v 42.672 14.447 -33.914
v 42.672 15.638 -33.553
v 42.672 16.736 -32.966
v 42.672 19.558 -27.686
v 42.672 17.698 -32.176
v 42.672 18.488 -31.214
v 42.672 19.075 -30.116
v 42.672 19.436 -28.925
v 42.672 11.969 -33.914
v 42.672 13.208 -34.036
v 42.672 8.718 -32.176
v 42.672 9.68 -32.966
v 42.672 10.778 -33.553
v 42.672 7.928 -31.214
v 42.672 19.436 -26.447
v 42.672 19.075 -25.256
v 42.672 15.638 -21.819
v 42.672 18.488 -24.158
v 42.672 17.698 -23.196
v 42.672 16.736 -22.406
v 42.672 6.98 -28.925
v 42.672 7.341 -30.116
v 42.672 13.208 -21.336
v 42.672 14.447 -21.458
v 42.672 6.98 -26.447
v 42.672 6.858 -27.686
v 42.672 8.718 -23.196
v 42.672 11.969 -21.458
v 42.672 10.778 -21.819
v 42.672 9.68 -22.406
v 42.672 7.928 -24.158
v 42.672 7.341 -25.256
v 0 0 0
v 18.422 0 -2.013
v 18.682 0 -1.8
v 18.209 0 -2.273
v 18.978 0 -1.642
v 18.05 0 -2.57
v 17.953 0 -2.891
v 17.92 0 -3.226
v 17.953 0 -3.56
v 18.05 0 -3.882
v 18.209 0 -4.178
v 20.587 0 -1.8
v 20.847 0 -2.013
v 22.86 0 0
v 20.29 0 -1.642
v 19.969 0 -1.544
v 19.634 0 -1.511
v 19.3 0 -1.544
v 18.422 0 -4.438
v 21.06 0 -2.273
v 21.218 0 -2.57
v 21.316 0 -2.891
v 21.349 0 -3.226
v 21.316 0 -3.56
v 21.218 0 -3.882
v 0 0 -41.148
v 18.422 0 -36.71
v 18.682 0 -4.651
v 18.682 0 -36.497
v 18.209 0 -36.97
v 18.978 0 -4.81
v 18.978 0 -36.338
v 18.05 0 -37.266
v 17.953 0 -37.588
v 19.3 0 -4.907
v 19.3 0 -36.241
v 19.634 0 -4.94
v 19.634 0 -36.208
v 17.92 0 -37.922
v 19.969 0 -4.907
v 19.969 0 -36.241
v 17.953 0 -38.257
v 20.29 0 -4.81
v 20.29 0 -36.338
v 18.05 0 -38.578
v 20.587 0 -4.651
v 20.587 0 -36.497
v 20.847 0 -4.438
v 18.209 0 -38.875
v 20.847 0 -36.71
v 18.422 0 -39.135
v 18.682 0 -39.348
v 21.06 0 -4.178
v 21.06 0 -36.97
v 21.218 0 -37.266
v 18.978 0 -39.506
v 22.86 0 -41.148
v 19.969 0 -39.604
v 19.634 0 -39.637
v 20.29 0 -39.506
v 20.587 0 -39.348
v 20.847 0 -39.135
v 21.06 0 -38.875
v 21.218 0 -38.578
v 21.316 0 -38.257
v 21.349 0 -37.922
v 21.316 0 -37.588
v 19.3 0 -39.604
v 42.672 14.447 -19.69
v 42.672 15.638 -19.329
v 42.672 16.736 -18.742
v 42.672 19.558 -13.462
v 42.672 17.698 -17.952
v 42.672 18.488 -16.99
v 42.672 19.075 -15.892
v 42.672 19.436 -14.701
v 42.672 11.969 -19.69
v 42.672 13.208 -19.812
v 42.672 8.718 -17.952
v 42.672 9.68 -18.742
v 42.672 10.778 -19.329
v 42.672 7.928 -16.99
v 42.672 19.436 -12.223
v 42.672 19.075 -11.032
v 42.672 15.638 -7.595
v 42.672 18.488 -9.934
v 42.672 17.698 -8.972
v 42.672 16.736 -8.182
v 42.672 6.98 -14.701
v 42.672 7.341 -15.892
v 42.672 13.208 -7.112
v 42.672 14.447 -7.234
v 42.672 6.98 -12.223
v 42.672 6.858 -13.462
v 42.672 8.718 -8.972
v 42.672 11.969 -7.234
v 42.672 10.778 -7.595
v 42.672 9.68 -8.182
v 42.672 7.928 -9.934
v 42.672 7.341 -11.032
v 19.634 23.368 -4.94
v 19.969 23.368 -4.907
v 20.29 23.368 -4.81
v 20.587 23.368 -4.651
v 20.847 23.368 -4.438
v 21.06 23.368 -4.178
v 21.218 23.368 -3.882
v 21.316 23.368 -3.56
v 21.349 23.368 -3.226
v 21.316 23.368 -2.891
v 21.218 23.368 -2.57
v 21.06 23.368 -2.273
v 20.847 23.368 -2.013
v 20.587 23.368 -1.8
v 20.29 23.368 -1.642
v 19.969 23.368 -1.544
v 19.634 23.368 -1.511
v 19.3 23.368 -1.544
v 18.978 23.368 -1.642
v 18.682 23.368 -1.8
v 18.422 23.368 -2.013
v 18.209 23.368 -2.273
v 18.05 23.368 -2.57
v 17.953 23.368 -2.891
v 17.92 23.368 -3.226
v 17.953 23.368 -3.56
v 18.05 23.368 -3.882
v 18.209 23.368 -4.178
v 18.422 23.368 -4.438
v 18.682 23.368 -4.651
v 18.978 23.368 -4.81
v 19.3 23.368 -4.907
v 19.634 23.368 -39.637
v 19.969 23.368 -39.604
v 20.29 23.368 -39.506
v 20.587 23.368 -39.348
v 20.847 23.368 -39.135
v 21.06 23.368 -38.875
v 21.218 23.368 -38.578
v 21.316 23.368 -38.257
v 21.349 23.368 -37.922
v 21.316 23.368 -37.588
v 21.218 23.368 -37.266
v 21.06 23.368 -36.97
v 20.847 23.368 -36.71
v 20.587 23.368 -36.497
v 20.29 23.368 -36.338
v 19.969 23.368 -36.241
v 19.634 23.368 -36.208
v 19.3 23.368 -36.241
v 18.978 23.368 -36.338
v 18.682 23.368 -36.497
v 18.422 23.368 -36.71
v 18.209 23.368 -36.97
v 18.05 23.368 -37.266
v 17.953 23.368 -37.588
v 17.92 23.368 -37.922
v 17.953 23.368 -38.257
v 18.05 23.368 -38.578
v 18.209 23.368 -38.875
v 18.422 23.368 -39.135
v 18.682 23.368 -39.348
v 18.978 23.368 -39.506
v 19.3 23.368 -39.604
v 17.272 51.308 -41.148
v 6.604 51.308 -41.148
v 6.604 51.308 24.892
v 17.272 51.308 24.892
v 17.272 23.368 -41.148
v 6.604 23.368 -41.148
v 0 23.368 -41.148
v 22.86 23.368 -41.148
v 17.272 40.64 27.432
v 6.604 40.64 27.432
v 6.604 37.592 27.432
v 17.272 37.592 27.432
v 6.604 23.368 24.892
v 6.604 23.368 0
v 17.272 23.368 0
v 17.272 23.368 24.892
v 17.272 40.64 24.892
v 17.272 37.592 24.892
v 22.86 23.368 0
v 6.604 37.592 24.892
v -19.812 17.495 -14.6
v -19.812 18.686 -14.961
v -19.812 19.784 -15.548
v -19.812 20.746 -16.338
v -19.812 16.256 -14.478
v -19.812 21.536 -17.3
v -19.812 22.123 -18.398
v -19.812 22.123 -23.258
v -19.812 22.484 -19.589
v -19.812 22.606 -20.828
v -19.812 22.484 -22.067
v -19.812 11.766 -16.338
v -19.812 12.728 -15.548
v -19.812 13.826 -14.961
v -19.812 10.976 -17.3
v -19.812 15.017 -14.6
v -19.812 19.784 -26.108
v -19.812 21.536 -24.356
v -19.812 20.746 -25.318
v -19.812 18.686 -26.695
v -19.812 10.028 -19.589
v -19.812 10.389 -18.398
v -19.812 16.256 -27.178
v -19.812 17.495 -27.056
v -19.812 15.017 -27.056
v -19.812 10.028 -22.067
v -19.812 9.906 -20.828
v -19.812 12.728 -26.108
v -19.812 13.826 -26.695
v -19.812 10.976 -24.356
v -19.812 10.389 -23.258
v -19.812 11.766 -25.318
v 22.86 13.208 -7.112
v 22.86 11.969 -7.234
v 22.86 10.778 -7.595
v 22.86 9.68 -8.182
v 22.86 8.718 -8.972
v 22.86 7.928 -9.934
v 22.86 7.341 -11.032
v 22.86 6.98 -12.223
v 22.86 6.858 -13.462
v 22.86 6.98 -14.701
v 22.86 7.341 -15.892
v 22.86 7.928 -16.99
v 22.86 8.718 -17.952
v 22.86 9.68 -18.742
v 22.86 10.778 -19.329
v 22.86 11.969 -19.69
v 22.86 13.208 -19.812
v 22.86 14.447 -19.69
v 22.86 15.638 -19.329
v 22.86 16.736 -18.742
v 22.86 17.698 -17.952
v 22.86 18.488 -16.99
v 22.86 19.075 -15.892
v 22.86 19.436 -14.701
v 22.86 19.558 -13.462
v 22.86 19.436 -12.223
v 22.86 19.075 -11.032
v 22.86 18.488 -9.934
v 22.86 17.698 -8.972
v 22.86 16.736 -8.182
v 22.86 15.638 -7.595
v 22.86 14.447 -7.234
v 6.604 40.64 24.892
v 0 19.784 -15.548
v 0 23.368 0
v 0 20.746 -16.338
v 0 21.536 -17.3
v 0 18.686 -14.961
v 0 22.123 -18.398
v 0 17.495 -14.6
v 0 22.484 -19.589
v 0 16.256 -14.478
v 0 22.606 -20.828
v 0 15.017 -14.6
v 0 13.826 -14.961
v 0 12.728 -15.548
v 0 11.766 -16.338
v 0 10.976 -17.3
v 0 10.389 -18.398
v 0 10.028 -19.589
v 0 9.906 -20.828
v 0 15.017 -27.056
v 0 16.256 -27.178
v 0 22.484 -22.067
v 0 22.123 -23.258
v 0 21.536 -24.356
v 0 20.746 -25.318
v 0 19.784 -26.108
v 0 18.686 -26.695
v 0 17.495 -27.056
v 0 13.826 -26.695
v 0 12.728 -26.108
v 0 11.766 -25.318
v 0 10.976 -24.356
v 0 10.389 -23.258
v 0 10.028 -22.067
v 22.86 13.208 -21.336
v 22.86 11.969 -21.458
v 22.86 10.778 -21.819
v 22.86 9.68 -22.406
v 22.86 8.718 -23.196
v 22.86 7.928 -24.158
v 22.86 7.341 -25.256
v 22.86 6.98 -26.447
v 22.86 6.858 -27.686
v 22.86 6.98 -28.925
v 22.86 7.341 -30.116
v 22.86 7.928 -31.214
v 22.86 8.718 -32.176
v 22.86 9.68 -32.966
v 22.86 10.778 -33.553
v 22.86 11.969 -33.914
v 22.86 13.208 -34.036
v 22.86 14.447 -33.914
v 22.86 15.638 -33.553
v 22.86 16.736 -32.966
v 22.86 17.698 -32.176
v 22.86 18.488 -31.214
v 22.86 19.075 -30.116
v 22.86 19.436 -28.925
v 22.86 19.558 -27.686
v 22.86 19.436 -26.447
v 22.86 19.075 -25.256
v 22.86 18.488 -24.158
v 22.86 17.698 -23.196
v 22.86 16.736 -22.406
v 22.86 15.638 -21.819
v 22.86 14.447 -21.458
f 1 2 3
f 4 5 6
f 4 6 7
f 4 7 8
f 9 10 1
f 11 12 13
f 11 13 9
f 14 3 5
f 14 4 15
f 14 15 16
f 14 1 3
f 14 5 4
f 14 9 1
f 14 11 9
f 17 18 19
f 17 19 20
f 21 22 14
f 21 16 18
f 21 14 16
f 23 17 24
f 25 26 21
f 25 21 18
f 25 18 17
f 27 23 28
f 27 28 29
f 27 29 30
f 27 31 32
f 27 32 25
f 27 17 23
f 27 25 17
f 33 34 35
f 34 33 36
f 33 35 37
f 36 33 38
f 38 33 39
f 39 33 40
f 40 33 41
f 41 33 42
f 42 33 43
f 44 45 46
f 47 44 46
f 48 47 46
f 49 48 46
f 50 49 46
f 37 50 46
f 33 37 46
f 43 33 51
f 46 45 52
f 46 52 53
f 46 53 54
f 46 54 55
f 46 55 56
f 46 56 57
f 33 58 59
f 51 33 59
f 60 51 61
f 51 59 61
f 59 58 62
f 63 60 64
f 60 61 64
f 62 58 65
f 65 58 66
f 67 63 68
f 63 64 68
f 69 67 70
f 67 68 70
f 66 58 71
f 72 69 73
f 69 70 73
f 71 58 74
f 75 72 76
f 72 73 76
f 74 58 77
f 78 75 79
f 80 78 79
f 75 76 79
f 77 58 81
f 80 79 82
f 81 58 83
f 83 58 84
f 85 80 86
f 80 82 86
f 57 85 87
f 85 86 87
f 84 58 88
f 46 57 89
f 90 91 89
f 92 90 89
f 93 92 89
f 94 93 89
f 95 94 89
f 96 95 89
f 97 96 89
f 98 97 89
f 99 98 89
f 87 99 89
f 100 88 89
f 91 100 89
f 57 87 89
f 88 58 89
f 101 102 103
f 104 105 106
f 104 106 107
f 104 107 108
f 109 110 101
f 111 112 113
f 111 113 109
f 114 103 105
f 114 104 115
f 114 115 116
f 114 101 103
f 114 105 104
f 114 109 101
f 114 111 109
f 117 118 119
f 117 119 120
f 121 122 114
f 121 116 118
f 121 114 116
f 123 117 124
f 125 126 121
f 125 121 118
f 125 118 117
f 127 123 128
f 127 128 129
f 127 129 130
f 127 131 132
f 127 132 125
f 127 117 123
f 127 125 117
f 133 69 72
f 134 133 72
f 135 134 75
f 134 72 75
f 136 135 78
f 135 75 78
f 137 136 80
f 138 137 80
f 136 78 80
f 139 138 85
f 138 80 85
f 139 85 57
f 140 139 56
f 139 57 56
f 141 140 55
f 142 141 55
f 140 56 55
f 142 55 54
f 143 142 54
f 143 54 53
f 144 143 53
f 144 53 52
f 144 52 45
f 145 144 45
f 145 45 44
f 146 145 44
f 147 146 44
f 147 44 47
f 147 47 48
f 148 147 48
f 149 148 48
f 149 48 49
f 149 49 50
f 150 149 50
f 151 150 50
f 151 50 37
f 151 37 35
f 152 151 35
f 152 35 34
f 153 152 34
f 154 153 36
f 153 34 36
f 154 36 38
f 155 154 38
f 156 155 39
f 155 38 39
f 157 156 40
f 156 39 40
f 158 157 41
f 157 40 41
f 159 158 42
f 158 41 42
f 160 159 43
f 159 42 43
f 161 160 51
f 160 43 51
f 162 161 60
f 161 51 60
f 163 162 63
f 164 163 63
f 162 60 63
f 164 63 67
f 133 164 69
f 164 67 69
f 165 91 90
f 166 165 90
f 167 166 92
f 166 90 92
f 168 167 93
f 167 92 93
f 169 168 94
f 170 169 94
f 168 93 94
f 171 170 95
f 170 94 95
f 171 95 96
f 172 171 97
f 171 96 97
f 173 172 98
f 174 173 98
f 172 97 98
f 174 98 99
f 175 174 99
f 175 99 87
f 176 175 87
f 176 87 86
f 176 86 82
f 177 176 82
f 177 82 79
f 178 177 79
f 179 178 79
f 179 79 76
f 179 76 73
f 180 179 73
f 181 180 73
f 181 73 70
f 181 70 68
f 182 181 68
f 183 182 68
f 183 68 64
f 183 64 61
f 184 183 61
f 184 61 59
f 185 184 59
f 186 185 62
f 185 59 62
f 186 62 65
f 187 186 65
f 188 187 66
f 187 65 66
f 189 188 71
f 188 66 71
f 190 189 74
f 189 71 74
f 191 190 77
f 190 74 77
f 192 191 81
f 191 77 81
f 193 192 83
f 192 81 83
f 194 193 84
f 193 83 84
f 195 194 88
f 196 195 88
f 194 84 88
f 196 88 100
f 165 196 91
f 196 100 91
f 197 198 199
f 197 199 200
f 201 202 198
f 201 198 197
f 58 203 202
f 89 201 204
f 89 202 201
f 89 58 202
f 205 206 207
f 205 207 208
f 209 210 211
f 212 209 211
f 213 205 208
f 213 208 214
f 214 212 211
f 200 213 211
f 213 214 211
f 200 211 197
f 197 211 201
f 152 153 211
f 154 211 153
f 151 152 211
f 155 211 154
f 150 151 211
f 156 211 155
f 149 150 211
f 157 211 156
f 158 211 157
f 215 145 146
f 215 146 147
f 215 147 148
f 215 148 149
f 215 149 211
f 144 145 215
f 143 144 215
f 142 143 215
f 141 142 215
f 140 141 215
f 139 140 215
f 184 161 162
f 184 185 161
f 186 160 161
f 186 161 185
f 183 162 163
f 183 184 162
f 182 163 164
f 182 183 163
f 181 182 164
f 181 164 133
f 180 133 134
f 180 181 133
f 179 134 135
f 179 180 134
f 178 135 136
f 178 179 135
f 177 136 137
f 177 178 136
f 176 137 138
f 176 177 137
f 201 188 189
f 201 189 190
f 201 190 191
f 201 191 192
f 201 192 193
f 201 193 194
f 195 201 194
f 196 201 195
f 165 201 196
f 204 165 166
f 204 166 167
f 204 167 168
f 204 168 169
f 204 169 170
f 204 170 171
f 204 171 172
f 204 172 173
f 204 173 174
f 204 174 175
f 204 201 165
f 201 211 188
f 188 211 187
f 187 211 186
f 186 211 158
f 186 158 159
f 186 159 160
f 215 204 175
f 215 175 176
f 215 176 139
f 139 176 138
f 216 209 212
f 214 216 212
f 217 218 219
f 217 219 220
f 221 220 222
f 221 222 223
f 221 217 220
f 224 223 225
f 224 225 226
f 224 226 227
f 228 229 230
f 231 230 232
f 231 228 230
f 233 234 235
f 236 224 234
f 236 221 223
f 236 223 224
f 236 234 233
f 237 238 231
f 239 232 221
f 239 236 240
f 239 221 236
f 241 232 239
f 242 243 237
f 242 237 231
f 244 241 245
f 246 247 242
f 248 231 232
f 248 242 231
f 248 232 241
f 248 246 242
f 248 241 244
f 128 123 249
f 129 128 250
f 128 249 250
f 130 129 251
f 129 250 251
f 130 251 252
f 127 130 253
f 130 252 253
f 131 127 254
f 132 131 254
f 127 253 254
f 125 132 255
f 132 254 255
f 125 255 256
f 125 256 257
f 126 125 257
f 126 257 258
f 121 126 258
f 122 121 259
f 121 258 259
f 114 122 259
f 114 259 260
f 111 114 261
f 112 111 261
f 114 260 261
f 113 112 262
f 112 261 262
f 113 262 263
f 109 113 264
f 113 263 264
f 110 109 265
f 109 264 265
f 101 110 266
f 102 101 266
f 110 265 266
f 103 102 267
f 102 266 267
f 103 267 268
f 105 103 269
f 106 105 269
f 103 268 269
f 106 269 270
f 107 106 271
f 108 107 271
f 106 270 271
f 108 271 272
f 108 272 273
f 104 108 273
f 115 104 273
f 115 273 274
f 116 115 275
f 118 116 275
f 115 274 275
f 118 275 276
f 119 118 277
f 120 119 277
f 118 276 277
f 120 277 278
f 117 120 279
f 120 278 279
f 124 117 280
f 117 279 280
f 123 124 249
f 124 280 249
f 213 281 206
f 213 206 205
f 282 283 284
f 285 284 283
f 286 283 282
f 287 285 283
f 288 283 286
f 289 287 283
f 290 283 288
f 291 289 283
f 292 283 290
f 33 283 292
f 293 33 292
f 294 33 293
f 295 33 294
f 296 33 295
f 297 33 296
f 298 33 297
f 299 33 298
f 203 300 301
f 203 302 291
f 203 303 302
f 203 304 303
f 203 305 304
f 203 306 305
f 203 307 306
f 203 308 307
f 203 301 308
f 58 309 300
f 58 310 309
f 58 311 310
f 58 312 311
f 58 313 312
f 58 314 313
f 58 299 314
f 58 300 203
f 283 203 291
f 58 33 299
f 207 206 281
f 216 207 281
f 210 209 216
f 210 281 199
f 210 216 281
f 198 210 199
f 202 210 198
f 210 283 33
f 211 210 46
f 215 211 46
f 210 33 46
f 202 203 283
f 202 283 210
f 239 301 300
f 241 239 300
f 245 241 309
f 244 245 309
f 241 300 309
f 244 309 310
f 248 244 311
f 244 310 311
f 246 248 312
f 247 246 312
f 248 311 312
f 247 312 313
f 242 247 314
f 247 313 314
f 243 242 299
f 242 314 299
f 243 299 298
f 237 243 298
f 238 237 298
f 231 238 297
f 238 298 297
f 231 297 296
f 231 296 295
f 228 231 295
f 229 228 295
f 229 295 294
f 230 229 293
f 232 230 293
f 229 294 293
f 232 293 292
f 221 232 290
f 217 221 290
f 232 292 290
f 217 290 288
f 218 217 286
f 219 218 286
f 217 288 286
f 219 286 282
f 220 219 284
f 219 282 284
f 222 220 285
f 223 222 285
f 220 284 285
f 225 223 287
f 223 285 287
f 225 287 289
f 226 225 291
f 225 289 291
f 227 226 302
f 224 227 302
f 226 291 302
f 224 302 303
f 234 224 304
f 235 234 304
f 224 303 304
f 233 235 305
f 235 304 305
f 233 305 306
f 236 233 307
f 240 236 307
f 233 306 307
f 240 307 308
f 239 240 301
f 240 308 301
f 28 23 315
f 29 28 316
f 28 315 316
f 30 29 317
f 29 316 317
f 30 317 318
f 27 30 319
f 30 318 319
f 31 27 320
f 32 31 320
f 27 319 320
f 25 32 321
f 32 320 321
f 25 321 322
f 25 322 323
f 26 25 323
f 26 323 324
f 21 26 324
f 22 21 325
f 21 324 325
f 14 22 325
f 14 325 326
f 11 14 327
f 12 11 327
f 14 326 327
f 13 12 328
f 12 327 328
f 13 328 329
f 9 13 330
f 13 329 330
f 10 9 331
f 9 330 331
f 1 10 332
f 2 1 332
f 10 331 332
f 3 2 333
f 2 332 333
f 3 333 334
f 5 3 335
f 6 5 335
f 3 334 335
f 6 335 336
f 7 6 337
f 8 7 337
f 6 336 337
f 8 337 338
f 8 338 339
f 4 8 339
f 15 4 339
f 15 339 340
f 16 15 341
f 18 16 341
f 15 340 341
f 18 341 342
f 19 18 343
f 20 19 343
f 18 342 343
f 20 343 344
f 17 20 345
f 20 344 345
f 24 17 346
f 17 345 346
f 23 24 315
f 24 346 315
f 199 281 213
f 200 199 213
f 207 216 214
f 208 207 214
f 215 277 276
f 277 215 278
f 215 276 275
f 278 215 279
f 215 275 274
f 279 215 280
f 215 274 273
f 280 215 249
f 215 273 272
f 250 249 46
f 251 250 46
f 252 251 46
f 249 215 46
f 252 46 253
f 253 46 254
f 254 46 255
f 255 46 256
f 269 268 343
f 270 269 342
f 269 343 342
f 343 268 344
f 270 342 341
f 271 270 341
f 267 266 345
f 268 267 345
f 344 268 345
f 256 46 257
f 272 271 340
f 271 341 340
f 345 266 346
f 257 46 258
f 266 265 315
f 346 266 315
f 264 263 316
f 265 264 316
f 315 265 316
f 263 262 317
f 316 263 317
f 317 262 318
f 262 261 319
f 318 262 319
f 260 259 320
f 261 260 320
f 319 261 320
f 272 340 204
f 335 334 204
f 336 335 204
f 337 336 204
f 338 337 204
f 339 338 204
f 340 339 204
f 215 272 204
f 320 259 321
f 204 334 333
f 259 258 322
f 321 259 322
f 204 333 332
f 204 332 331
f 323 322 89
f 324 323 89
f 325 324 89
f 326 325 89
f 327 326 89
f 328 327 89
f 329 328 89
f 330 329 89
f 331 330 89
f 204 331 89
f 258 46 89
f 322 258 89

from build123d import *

# Parameters (mm, degrees)
SKETCH1_W           = 22.86
SKETCH1_H           = 41.148
BOSS_EXTRUDE1_DEPTH = 23.368
SKETCH2_W           = 10.668
SKETCH2_H           = 66.04
BOSS_EXTRUDE2_DEPTH = 27.94
SKETCH3_R           = 6.35
BOSS_EXTRUDE3_DEPTH = 19.812
SKETCH4_R           = 6.35
BOSS_EXTRUDE4_DEPTH = 19.812
SKETCH5_W           = 10.668
SKETCH5_H           = 3.048
BOSS_EXTRUDE5_DEPTH = 2.54
SKETCH6_R           = 1.7145
CUT_EXTRUDE1_DEPTH  = 79.400053265


with BuildPart() as part:
    # Sketch1 → Boss-Extrude1 (new body)
    with BuildSketch(Plane(origin=(0, 0, 0), x_dir=(1, 0, 0), z_dir=(0, 1, 0))):
        with Locations((11.43, 20.574)):
            Rectangle(SKETCH1_W, SKETCH1_H)
    extrude(amount=BOSS_EXTRUDE1_DEPTH)

    # Sketch2 → Boss-Extrude2 (add)
    with BuildSketch(Plane(origin=(0, 23.368, 0), x_dir=(1, 0, 0), z_dir=(0, 1, 0))):
        with Locations((11.938, 8.128)):
            Rectangle(SKETCH2_W, SKETCH2_H)
    extrude(amount=BOSS_EXTRUDE2_DEPTH)

    # Sketch3 → Boss-Extrude3 (add)
    with BuildSketch(Plane.ZY):
        with Locations(Location((-20.828, 16.256, 0), (0, 0, 180))):
            Circle(SKETCH3_R)
    extrude(amount=BOSS_EXTRUDE3_DEPTH)

    # Sketch4 → Boss-Extrude4 (add)
    with BuildSketch(Plane(origin=(22.86, 0, 0), x_dir=(0, 0, -1), z_dir=(1, 0, 0))):
        with Locations(Location((27.686, 13.208, 0), (0, 0, 180))):
            Circle(SKETCH4_R)
        with Locations(Location((13.462, 13.208, 0), (0, 0, 180))):
            Circle(SKETCH4_R)
    extrude(amount=BOSS_EXTRUDE4_DEPTH)

    # Sketch5 → Boss-Extrude5 (add)
    with BuildSketch(Plane.XY.offset(24.892)):
        with Locations((11.938, 39.116)):
            Rectangle(SKETCH5_W, SKETCH5_H)
    extrude(amount=BOSS_EXTRUDE5_DEPTH)

    # Sketch6 → Cut-Extrude1 (cut, through all)
    with BuildSketch(Plane(origin=(0, 0, 0), x_dir=(-1, 0, 0), z_dir=(0, -1, 0))):
        with Locations(Location((-19.6342, 3.2258, 0), (0, 0, 90))):
            Circle(SKETCH6_R)
        with Locations(Location((-19.6342, 37.9222, 0), (0, 0, 90))):
            Circle(SKETCH6_R)
    extrude(amount=-CUT_EXTRUDE1_DEPTH, mode=Mode.SUBTRACT)


solid = part.part
